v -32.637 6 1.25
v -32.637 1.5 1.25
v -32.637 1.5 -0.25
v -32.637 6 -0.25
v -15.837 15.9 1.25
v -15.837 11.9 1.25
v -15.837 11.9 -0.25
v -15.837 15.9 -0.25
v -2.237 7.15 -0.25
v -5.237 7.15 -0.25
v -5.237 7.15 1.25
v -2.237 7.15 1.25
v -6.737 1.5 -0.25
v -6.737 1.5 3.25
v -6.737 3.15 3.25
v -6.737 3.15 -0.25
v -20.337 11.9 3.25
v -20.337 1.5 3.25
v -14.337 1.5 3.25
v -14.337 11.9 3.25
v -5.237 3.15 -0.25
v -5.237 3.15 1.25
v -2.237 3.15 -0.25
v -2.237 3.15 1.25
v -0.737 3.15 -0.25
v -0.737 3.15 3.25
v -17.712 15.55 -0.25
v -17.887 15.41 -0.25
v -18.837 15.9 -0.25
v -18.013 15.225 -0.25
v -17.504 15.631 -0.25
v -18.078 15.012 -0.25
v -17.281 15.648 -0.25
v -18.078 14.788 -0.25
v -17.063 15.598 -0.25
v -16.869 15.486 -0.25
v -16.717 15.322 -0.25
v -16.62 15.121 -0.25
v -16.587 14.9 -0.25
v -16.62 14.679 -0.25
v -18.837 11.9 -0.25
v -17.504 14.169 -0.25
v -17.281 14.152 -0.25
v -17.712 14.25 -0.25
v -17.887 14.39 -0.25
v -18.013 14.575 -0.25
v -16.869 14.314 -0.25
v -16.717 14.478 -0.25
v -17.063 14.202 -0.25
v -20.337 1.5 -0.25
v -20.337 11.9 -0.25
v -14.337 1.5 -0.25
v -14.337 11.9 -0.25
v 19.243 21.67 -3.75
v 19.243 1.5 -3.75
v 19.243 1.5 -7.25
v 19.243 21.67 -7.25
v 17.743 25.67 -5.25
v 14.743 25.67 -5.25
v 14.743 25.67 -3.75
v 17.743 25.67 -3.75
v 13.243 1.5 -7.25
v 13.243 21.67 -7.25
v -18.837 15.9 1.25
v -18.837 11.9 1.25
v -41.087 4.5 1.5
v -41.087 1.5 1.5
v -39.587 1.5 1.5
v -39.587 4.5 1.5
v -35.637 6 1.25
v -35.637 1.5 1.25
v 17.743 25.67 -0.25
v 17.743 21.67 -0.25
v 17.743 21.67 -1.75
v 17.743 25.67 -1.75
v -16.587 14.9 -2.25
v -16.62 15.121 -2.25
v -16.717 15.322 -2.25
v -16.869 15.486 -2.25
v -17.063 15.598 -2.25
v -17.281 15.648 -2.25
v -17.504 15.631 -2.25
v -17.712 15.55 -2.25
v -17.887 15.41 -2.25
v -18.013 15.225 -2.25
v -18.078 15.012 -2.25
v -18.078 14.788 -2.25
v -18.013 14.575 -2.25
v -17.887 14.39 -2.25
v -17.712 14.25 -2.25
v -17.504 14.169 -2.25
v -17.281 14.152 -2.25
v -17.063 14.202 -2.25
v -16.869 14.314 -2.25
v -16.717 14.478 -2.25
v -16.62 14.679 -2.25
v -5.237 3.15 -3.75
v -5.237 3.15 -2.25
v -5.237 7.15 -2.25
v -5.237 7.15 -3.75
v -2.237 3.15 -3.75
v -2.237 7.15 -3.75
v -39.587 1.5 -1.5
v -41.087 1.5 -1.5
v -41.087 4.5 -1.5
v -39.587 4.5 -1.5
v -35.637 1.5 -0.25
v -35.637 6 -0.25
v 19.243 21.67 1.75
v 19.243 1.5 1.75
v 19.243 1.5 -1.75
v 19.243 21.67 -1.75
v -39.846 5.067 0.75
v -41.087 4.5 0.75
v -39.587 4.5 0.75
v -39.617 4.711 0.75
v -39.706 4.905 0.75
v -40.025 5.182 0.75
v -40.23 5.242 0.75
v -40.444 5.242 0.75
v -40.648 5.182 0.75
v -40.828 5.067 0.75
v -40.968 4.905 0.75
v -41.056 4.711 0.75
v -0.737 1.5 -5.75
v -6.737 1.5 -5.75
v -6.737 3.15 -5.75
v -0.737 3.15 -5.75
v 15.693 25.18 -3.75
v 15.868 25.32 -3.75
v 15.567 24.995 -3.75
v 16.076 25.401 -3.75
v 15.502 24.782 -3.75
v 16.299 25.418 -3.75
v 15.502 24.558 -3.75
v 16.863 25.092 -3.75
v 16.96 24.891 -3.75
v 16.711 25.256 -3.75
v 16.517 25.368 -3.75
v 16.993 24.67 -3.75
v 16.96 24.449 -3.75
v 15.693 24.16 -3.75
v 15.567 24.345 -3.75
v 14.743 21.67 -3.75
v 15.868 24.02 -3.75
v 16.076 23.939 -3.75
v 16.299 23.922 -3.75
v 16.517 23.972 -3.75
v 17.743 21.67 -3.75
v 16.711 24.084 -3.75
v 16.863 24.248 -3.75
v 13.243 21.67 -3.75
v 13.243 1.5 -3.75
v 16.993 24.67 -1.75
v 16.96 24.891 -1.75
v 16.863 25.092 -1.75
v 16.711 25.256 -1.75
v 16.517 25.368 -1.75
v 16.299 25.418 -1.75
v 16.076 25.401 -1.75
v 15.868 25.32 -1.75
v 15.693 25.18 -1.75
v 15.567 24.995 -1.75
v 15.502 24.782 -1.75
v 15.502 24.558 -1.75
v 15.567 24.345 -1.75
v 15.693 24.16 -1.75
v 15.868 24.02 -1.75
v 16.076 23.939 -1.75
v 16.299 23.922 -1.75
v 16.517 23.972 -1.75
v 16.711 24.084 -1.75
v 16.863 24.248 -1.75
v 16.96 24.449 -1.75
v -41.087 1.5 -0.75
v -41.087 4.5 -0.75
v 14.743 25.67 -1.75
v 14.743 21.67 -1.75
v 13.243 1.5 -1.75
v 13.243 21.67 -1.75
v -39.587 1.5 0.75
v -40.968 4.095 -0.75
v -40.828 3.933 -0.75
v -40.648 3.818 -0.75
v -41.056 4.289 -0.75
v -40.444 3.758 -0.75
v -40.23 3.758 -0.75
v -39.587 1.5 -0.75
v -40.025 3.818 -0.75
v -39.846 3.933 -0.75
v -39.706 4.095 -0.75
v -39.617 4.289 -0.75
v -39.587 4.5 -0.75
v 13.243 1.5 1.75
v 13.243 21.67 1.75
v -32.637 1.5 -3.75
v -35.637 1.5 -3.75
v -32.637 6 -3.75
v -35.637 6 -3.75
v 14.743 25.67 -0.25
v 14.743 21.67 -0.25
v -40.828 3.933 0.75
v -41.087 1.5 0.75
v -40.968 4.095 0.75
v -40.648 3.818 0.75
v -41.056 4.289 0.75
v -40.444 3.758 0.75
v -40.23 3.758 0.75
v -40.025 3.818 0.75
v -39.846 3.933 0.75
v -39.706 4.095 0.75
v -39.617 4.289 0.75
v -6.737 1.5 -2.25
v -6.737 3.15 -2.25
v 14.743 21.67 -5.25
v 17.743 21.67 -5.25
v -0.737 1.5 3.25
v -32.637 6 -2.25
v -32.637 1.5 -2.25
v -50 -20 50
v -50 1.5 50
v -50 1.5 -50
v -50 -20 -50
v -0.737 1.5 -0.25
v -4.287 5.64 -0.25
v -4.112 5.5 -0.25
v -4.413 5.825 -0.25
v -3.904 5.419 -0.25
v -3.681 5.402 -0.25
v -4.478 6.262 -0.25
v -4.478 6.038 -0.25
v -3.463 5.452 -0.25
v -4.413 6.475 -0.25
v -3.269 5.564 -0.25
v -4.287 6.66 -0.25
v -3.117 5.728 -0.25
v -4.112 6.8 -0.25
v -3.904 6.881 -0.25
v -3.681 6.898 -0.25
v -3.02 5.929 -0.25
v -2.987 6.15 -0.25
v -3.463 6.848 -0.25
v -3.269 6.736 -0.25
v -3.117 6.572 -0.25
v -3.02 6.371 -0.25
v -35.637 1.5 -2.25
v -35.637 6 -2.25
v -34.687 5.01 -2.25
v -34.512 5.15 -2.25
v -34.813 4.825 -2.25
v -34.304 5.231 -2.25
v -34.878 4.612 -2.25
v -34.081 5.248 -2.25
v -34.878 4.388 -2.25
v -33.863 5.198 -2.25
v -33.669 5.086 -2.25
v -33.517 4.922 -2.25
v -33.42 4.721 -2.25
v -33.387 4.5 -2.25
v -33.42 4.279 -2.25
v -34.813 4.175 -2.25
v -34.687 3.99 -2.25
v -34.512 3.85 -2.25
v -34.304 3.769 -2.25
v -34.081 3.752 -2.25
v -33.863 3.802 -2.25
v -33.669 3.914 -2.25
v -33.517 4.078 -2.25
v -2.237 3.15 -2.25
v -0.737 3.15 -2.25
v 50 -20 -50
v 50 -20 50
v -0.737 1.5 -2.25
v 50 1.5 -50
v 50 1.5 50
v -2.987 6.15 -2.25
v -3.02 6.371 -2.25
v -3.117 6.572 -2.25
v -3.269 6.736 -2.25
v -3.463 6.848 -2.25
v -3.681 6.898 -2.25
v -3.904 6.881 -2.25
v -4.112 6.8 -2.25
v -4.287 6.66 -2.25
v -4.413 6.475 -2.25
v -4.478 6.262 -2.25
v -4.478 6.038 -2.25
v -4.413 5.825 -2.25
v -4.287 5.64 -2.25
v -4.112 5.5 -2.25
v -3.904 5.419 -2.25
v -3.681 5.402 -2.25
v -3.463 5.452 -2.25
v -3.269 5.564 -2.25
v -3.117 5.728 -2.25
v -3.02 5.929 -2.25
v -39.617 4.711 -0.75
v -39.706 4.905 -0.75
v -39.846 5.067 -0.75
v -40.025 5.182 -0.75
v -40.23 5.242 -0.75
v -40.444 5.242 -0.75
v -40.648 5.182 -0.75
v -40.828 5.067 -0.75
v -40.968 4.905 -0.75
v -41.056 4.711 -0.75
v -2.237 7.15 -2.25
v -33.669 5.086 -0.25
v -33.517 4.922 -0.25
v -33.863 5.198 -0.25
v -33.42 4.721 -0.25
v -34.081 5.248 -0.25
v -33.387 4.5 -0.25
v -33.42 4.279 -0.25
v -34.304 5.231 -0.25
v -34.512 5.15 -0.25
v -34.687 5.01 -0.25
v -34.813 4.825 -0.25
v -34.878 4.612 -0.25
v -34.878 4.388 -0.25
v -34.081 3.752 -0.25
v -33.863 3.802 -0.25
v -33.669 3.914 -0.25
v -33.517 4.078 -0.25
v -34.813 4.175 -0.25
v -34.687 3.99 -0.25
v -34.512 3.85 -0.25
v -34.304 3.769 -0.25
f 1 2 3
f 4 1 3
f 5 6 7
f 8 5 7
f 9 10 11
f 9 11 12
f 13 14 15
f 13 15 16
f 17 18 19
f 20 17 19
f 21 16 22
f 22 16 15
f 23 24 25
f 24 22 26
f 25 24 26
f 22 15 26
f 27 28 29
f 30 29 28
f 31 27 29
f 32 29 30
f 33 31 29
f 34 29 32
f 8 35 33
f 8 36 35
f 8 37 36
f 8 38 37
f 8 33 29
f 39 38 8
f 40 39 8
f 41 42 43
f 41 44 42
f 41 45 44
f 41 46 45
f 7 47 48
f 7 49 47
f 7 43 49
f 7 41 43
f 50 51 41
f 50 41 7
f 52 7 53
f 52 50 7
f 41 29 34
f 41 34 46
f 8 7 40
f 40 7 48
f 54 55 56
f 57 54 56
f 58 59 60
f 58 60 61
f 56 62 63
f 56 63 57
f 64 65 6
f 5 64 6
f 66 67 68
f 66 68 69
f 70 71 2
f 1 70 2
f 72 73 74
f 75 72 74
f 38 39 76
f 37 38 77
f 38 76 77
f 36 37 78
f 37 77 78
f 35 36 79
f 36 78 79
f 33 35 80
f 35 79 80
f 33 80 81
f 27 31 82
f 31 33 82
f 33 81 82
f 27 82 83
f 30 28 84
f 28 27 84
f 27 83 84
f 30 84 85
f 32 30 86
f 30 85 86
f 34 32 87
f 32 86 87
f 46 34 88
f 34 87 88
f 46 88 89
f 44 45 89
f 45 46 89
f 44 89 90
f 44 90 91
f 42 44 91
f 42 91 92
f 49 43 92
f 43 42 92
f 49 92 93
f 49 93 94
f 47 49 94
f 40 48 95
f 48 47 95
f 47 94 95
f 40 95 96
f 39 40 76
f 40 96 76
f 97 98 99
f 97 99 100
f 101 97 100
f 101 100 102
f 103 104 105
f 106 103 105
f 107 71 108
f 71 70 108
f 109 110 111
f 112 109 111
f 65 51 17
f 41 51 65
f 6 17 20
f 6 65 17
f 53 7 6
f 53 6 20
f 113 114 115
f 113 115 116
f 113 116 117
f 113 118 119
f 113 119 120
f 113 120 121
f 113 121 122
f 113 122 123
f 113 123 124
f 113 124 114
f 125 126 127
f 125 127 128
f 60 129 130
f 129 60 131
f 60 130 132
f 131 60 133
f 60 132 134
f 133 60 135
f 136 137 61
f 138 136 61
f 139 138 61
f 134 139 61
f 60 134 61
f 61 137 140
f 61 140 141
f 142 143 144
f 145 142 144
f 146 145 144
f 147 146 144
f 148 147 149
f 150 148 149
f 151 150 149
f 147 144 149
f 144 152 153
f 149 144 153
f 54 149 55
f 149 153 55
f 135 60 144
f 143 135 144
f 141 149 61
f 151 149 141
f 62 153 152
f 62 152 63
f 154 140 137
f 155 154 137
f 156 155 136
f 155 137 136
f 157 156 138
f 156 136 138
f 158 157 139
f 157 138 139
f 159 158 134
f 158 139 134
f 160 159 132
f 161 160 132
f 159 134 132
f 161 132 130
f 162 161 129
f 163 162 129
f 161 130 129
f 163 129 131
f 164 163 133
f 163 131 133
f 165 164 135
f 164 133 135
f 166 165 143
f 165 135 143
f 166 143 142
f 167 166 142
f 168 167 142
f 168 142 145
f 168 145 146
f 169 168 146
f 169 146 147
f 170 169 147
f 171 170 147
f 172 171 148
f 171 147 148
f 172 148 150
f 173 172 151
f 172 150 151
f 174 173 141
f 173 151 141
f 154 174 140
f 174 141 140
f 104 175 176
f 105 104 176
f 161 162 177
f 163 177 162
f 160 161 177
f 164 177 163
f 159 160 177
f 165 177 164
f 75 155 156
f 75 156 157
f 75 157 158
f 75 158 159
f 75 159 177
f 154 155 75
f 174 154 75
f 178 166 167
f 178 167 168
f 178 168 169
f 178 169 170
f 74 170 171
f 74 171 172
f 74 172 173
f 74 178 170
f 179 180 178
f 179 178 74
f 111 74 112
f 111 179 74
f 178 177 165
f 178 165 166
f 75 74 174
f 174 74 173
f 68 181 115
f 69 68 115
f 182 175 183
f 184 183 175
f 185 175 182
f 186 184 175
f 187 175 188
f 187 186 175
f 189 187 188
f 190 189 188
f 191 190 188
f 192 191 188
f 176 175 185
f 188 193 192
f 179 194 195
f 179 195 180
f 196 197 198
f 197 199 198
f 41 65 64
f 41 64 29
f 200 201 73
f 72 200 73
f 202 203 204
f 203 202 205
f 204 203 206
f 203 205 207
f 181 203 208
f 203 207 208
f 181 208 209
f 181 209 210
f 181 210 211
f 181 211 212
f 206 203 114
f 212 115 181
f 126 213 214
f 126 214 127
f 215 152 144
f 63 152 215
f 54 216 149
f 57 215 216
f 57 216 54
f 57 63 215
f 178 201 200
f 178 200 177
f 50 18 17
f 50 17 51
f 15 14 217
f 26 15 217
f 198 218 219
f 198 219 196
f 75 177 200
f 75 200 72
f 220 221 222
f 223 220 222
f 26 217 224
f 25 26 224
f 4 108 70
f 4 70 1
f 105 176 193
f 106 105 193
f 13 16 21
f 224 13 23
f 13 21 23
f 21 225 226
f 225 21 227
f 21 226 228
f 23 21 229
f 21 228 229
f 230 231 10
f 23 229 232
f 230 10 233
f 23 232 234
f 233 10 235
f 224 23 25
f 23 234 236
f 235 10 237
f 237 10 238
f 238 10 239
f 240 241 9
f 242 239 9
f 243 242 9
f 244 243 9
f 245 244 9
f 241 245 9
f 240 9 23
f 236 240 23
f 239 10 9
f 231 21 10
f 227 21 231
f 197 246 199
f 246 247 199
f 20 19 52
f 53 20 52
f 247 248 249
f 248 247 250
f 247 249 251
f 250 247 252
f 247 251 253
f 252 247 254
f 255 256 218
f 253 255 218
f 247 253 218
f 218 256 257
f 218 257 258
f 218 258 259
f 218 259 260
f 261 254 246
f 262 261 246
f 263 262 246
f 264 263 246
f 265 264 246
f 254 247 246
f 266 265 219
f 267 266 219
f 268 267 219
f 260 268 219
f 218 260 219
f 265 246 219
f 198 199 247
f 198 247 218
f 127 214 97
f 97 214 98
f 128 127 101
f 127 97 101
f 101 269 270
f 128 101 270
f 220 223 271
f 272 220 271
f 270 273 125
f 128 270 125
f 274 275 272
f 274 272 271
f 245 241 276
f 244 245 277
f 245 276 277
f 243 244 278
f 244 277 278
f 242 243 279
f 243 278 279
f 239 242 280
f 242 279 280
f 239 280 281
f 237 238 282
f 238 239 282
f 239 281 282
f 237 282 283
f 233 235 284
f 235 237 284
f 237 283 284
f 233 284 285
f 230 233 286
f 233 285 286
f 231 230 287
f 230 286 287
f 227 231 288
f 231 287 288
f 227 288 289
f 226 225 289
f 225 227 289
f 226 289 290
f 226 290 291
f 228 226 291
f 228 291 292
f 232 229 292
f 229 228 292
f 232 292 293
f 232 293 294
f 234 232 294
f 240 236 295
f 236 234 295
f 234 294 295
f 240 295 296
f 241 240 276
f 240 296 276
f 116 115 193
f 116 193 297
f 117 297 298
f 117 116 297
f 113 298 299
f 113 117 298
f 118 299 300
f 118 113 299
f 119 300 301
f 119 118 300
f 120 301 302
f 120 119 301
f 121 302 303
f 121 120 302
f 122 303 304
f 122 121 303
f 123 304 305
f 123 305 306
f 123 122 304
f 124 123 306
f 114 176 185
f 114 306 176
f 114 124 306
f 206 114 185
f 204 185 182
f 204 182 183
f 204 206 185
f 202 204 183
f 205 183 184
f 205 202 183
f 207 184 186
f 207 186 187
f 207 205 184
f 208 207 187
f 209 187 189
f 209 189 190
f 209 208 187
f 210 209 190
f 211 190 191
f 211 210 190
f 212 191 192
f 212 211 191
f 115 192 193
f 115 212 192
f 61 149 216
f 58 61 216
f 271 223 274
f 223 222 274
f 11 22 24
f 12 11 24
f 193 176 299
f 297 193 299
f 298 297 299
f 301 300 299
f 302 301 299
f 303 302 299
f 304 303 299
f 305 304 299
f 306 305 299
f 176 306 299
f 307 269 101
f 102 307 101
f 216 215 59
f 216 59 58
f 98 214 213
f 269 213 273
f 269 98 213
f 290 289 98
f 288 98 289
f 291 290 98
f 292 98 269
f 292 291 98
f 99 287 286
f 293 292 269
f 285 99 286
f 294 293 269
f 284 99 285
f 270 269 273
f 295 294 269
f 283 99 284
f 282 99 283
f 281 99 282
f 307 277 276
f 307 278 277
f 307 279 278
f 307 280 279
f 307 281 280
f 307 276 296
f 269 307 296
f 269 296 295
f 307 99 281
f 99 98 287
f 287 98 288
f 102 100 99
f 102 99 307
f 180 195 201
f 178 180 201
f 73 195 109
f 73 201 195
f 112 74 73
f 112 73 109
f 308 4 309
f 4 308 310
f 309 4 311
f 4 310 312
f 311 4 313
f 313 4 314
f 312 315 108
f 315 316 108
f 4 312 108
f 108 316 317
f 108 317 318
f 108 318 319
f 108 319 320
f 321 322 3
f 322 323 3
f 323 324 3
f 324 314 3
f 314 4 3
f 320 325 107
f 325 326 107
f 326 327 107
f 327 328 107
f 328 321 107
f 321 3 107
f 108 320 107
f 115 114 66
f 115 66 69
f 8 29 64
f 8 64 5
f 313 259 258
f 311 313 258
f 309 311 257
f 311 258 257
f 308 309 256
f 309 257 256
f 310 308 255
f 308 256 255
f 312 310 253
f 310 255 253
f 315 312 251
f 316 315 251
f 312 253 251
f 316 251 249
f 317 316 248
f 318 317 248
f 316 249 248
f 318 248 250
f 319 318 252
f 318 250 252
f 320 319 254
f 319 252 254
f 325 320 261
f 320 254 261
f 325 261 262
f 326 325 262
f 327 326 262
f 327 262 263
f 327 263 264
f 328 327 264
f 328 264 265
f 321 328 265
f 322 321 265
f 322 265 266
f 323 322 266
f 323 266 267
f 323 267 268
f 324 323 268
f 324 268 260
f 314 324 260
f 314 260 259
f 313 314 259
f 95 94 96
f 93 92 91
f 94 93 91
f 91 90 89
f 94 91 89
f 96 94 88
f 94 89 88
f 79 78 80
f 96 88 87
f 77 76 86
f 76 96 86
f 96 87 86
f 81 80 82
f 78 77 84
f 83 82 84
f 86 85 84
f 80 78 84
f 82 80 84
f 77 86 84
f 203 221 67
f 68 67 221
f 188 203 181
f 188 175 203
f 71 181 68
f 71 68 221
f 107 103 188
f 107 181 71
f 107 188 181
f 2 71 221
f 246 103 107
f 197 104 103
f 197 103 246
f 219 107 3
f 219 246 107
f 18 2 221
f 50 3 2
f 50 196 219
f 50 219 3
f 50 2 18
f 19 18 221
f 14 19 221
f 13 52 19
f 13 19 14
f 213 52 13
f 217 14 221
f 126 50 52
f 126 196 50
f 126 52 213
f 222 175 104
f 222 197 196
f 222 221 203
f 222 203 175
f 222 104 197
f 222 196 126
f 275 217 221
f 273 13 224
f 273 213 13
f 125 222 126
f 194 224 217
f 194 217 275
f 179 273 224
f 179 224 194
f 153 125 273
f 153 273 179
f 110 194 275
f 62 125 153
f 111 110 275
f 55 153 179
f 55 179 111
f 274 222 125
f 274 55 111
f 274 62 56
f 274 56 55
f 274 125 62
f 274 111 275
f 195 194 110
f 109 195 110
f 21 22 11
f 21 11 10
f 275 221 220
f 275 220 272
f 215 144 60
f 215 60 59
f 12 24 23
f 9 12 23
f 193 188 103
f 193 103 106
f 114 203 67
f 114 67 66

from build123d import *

# Parameters (mm, degrees)
SKETCH_1_W             = 100
SKETCH_1_H             = 100
EXTRUDE_1_DEPTH        = 1.5
EXTRUDE_1_DEPTH_BACK   = 20
SKETCH_2_R             = 0.75
EXTRUDE_2_DEPTH        = 0.75
SKETCH_3_W             = 1.5
SKETCH_3_H             = 3
EXTRUDE_3_DEPTH        = 1.5
SKETCH_5_W             = 3
SKETCH_5_H             = 1.5
EXTRUDE_4_DEPTH        = 3
SKETCH_7_R             = 0.75
EXTRUDE_5_DEPTH        = 2.5
SKETCH_8_W             = 6
SKETCH_8_H             = 9
EXTRUDE_6_DEPTH        = 10.4
SKETCH_9_W             = 3
SKETCH_9_H             = 1.5
EXTRUDE_7_DEPTH        = 4
SKETCH_10_R            = 0.75
EXTRUDE_8_DEPTH        = 3
SKETCH_11_W            = 6
SKETCH_11_H            = 2
CUT_EXTRUDE_1_DEPTH    = 10.4
SKETCH_12_W            = 6
SKETCH_12_H            = 3.5
EXTRUDE_9_DEPTH        = 20.17
SKETCH_13_W            = 3
SKETCH_13_H            = 1.5
EXTRUDE_10_DEPTH       = 4
SKETCH_14_R            = 0.75
EXTRUDE_11_DEPTH       = 2
PATTERN_LINEAR_2_COUNT = 2
PATTERN_LINEAR_2_PITCH = 13.6
SKETCH_16_W            = 6
SKETCH_16_H            = 8.75
CUT_EXTRUDE_2_DEPTH    = 9.25
SKETCH_17_W            = 6
SKETCH_17_H            = 2
CUT_EXTRUDE_3_DEPTH    = 1.65
SKETCH_18_W            = 3
SKETCH_18_H            = 1.5
EXTRUDE_12_DEPTH       = 4
SKETCH_19_R            = 0.75
EXTRUDE_13_DEPTH       = 3
EXTRUDE_14_DEPTH       = 1.5
SKETCH_21_W            = 0.75
SKETCH_21_H            = 3
CUT_EXTRUDE_4_DEPTH    = 1.5
SKETCH_22_W            = 1.5
SKETCH_22_H            = 0.5
EXTRUDE_15_DEPTH       = 2.5
SKETCH_23_W            = 3.5
SKETCH_23_H            = 14.4
CUT_EXTRUDE_5_DEPTH    = 6


with BuildPart() as part:
    # 草圖1 → 填料-伸長1 (new body, two sides)
    with BuildSketch(Plane(origin=(0, 0, 0), x_dir=(1, 0, 0), z_dir=(0, 1, 0))) as extrude_1_sk:
        Rectangle(SKETCH_1_W, SKETCH_1_H)
    extrude(amount=EXTRUDE_1_DEPTH)
    extrude(extrude_1_sk.sketch, amount=-EXTRUDE_1_DEPTH_BACK)



with BuildPart() as body_2:
    # 草圖2 → 填料-伸長2 (new body, symmetric)
    with BuildSketch(Plane.XY):
        with Locations((-40.336831864, 4.5)):
            Circle(SKETCH_2_R)
    extrude(amount=EXTRUDE_2_DEPTH, both=True)


with BuildPart() as part_1:
    add(part.part)

    add(body_2.part)  # 填料-伸長3 merges body 2
    # 草圖3 → 填料-伸長3 (add)
    with BuildSketch(Plane.XY.offset(0.75)):
        with Locations((-40.336831864, 3)):
            Rectangle(SKETCH_3_W, SKETCH_3_H)
    extrude_3 = extrude(amount=EXTRUDE_3_DEPTH)

    # 鏡射1: 填料-伸長3 across plane
    add(extrude_3.mirror(Plane.XY))

    # 草圖5 → 填料-伸長4 (add)
    with BuildSketch(Plane(origin=(0, 4.5, 0), x_dir=(1, 0, 0), z_dir=(0, 1, 0))):
        with Locations((-34.136831864, -0.5)):
            Rectangle(SKETCH_5_W, SKETCH_5_H)
        with Locations((-34.136831864, 3)):
            Rectangle(SKETCH_5_W, SKETCH_5_H)
    extrude(amount=-EXTRUDE_4_DEPTH)

    # 草圖7 → 填料-伸長5 (add)
    with BuildSketch(Plane.XY.offset(-2.25)):
        with Locations((-34.136831864, 4.5)):
            Circle(SKETCH_7_R)
    extrude(amount=EXTRUDE_5_DEPTH)

    # 草圖8 → 填料-伸長6 (add)
    with BuildSketch(Plane(origin=(0, 1.5, 0), x_dir=(1, 0, 0), z_dir=(0, 1, 0))):
        with Locations((-17.336831864, 1.25)):
            Rectangle(SKETCH_8_W, SKETCH_8_H)
    extrude_6 = extrude(amount=EXTRUDE_6_DEPTH)

    # 草圖9 → 填料-伸長7 (add)
    with BuildSketch(Plane(origin=(0, 11.9, 0), x_dir=(1, 0, 0), z_dir=(0, 1, 0))):
        with Locations((-17.336831864, 3)):
            Rectangle(SKETCH_9_W, SKETCH_9_H)
        with Locations((-17.336831864, -0.5)):
            Rectangle(SKETCH_9_W, SKETCH_9_H)
    extrude(amount=EXTRUDE_7_DEPTH)

    # 草圖10 → 填料-伸長8 (add)
    with BuildSketch(Plane.XY.offset(-2.25)):
        with Locations((-17.336831864, 14.9)):
            Circle(SKETCH_10_R)
    extrude(amount=EXTRUDE_8_DEPTH)

    # 草圖11 → 除料-伸長1 (cut)
    with BuildSketch(Plane(origin=(0, 11.9, 0), x_dir=(1, 0, 0), z_dir=(0, 1, 0))):
        with Locations((-17.336831864, 1.25)):
            Rectangle(SKETCH_11_W, SKETCH_11_H)
    extrude(amount=-CUT_EXTRUDE_1_DEPTH, mode=Mode.SUBTRACT)

    # 草圖12 → 填料-伸長9 (add)
    with BuildSketch(Plane(origin=(0, 1.5, 0), x_dir=(1, 0, 0), z_dir=(0, 1, 0))):
        with Locations((16.243168136, 0)):
            Rectangle(SKETCH_12_W, SKETCH_12_H)
        with Locations((16.243168136, 5.5)):
            Rectangle(SKETCH_12_W, SKETCH_12_H)
    extrude(amount=EXTRUDE_9_DEPTH)

    # 草圖13 → 填料-伸長10 (add)
    with BuildSketch(Plane(origin=(0, 21.67, 0), x_dir=(1, 0, 0), z_dir=(0, 1, 0))):
        with Locations((16.243168136, 1)):
            Rectangle(SKETCH_13_W, SKETCH_13_H)
        with Locations((16.243168136, 4.5)):
            Rectangle(SKETCH_13_W, SKETCH_13_H)
    extrude(amount=EXTRUDE_10_DEPTH)

    # 草圖14 → 填料-伸長11 (add)
    with BuildSketch(Plane.XY.offset(-3.75)):
        with Locations((16.243168136, 24.67)):
            Circle(SKETCH_14_R)
    extrude(amount=EXTRUDE_11_DEPTH)

    # 直線複製排列2: 填料-伸長6 ×2
    with Locations(*[(i * PATTERN_LINEAR_2_PITCH, 0, 0) for i in range(1, PATTERN_LINEAR_2_COUNT)]):
        add(extrude_6)

    # 草圖16 → 除料-伸長2 (cut, symmetric)
    with BuildSketch(Plane.XY):
        with Locations((-3.736831864, 7.525)):
            Rectangle(SKETCH_16_W, SKETCH_16_H)
    extrude(amount=CUT_EXTRUDE_2_DEPTH, both=True, mode=Mode.SUBTRACT)

    # 草圖17 → 除料-伸長3 (cut)
    with BuildSketch(Plane(origin=(0, 3.15, 0), x_dir=(1, 0, 0), z_dir=(0, 1, 0))):
        with Locations((-3.736831864, 1.25)):
            Rectangle(SKETCH_17_W, SKETCH_17_H)
    extrude(amount=-CUT_EXTRUDE_3_DEPTH, mode=Mode.SUBTRACT)

    # 草圖18 → 填料-伸長12 (add)
    with BuildSketch(Plane(origin=(0, 3.15, 0), x_dir=(1, 0, 0), z_dir=(0, 1, 0))):
        with Locations((-3.736831864, 3)):
            Rectangle(SKETCH_18_W, SKETCH_18_H)
        with Locations((-3.736831864, -0.5)):
            Rectangle(SKETCH_18_W, SKETCH_18_H)
    extrude(amount=EXTRUDE_12_DEPTH)

    # 草圖19 → 填料-伸長13 (add)
    with BuildSketch(Plane.XY.offset(-2.25)):
        with Locations((-3.736831864, 6.15)):
            Circle(SKETCH_19_R)
    extrude(amount=EXTRUDE_13_DEPTH)

    # 草圖20 → 填料-伸長14 (add)
    with BuildSketch(Plane(origin=(0, 4.5, 0), x_dir=(1, 0, 0), z_dir=(0, 1, 0))):
        Polygon((-32.636831864, 0.25), (-33.386831864, 0.25), (-33.386831864, -0.25), (-34.886831864, -0.25), (-34.886831864, 0.25), (-35.636831864, 0.25), (-35.636831864, -1.25), (-32.636831864, -1.25), align=None)
        Polygon((-35.636831864, 3.75), (-35.636831864, 2.25), (-34.886831864, 2.25), (-33.386831864, 2.25), (-32.636831864, 2.25), (-32.636831864, 3.75), align=None)
    extrude(amount=EXTRUDE_14_DEPTH)

    # 草圖21 → 除料-伸長4 (cut)
    with BuildSketch(Plane.ZY.offset(41.086831864)):
        with Locations((1.875, 3)):
            Rectangle(SKETCH_21_W, SKETCH_21_H)
        with Locations((-1.875, 3)):
            Rectangle(SKETCH_21_W, SKETCH_21_H)
    extrude(amount=-CUT_EXTRUDE_4_DEPTH, mode=Mode.SUBTRACT)

    # 草圖22 → 填料-伸長15 (add)
    with BuildSketch(Plane(origin=(0, 6, 0), x_dir=(1, 0, 0), z_dir=(0, 1, 0))):
        with Locations((-34.136831864, 0)):
            Rectangle(SKETCH_22_W, SKETCH_22_H)
    extrude(amount=-EXTRUDE_15_DEPTH)

    # 草圖23 → 除料-伸長5 (cut)
    with BuildSketch(Plane.ZY.offset(20.336831864)):
        with Locations((-4, 8.7)):
            Rectangle(SKETCH_23_W, SKETCH_23_H)
    extrude(amount=-CUT_EXTRUDE_5_DEPTH, mode=Mode.SUBTRACT)


solid = part_1.part
